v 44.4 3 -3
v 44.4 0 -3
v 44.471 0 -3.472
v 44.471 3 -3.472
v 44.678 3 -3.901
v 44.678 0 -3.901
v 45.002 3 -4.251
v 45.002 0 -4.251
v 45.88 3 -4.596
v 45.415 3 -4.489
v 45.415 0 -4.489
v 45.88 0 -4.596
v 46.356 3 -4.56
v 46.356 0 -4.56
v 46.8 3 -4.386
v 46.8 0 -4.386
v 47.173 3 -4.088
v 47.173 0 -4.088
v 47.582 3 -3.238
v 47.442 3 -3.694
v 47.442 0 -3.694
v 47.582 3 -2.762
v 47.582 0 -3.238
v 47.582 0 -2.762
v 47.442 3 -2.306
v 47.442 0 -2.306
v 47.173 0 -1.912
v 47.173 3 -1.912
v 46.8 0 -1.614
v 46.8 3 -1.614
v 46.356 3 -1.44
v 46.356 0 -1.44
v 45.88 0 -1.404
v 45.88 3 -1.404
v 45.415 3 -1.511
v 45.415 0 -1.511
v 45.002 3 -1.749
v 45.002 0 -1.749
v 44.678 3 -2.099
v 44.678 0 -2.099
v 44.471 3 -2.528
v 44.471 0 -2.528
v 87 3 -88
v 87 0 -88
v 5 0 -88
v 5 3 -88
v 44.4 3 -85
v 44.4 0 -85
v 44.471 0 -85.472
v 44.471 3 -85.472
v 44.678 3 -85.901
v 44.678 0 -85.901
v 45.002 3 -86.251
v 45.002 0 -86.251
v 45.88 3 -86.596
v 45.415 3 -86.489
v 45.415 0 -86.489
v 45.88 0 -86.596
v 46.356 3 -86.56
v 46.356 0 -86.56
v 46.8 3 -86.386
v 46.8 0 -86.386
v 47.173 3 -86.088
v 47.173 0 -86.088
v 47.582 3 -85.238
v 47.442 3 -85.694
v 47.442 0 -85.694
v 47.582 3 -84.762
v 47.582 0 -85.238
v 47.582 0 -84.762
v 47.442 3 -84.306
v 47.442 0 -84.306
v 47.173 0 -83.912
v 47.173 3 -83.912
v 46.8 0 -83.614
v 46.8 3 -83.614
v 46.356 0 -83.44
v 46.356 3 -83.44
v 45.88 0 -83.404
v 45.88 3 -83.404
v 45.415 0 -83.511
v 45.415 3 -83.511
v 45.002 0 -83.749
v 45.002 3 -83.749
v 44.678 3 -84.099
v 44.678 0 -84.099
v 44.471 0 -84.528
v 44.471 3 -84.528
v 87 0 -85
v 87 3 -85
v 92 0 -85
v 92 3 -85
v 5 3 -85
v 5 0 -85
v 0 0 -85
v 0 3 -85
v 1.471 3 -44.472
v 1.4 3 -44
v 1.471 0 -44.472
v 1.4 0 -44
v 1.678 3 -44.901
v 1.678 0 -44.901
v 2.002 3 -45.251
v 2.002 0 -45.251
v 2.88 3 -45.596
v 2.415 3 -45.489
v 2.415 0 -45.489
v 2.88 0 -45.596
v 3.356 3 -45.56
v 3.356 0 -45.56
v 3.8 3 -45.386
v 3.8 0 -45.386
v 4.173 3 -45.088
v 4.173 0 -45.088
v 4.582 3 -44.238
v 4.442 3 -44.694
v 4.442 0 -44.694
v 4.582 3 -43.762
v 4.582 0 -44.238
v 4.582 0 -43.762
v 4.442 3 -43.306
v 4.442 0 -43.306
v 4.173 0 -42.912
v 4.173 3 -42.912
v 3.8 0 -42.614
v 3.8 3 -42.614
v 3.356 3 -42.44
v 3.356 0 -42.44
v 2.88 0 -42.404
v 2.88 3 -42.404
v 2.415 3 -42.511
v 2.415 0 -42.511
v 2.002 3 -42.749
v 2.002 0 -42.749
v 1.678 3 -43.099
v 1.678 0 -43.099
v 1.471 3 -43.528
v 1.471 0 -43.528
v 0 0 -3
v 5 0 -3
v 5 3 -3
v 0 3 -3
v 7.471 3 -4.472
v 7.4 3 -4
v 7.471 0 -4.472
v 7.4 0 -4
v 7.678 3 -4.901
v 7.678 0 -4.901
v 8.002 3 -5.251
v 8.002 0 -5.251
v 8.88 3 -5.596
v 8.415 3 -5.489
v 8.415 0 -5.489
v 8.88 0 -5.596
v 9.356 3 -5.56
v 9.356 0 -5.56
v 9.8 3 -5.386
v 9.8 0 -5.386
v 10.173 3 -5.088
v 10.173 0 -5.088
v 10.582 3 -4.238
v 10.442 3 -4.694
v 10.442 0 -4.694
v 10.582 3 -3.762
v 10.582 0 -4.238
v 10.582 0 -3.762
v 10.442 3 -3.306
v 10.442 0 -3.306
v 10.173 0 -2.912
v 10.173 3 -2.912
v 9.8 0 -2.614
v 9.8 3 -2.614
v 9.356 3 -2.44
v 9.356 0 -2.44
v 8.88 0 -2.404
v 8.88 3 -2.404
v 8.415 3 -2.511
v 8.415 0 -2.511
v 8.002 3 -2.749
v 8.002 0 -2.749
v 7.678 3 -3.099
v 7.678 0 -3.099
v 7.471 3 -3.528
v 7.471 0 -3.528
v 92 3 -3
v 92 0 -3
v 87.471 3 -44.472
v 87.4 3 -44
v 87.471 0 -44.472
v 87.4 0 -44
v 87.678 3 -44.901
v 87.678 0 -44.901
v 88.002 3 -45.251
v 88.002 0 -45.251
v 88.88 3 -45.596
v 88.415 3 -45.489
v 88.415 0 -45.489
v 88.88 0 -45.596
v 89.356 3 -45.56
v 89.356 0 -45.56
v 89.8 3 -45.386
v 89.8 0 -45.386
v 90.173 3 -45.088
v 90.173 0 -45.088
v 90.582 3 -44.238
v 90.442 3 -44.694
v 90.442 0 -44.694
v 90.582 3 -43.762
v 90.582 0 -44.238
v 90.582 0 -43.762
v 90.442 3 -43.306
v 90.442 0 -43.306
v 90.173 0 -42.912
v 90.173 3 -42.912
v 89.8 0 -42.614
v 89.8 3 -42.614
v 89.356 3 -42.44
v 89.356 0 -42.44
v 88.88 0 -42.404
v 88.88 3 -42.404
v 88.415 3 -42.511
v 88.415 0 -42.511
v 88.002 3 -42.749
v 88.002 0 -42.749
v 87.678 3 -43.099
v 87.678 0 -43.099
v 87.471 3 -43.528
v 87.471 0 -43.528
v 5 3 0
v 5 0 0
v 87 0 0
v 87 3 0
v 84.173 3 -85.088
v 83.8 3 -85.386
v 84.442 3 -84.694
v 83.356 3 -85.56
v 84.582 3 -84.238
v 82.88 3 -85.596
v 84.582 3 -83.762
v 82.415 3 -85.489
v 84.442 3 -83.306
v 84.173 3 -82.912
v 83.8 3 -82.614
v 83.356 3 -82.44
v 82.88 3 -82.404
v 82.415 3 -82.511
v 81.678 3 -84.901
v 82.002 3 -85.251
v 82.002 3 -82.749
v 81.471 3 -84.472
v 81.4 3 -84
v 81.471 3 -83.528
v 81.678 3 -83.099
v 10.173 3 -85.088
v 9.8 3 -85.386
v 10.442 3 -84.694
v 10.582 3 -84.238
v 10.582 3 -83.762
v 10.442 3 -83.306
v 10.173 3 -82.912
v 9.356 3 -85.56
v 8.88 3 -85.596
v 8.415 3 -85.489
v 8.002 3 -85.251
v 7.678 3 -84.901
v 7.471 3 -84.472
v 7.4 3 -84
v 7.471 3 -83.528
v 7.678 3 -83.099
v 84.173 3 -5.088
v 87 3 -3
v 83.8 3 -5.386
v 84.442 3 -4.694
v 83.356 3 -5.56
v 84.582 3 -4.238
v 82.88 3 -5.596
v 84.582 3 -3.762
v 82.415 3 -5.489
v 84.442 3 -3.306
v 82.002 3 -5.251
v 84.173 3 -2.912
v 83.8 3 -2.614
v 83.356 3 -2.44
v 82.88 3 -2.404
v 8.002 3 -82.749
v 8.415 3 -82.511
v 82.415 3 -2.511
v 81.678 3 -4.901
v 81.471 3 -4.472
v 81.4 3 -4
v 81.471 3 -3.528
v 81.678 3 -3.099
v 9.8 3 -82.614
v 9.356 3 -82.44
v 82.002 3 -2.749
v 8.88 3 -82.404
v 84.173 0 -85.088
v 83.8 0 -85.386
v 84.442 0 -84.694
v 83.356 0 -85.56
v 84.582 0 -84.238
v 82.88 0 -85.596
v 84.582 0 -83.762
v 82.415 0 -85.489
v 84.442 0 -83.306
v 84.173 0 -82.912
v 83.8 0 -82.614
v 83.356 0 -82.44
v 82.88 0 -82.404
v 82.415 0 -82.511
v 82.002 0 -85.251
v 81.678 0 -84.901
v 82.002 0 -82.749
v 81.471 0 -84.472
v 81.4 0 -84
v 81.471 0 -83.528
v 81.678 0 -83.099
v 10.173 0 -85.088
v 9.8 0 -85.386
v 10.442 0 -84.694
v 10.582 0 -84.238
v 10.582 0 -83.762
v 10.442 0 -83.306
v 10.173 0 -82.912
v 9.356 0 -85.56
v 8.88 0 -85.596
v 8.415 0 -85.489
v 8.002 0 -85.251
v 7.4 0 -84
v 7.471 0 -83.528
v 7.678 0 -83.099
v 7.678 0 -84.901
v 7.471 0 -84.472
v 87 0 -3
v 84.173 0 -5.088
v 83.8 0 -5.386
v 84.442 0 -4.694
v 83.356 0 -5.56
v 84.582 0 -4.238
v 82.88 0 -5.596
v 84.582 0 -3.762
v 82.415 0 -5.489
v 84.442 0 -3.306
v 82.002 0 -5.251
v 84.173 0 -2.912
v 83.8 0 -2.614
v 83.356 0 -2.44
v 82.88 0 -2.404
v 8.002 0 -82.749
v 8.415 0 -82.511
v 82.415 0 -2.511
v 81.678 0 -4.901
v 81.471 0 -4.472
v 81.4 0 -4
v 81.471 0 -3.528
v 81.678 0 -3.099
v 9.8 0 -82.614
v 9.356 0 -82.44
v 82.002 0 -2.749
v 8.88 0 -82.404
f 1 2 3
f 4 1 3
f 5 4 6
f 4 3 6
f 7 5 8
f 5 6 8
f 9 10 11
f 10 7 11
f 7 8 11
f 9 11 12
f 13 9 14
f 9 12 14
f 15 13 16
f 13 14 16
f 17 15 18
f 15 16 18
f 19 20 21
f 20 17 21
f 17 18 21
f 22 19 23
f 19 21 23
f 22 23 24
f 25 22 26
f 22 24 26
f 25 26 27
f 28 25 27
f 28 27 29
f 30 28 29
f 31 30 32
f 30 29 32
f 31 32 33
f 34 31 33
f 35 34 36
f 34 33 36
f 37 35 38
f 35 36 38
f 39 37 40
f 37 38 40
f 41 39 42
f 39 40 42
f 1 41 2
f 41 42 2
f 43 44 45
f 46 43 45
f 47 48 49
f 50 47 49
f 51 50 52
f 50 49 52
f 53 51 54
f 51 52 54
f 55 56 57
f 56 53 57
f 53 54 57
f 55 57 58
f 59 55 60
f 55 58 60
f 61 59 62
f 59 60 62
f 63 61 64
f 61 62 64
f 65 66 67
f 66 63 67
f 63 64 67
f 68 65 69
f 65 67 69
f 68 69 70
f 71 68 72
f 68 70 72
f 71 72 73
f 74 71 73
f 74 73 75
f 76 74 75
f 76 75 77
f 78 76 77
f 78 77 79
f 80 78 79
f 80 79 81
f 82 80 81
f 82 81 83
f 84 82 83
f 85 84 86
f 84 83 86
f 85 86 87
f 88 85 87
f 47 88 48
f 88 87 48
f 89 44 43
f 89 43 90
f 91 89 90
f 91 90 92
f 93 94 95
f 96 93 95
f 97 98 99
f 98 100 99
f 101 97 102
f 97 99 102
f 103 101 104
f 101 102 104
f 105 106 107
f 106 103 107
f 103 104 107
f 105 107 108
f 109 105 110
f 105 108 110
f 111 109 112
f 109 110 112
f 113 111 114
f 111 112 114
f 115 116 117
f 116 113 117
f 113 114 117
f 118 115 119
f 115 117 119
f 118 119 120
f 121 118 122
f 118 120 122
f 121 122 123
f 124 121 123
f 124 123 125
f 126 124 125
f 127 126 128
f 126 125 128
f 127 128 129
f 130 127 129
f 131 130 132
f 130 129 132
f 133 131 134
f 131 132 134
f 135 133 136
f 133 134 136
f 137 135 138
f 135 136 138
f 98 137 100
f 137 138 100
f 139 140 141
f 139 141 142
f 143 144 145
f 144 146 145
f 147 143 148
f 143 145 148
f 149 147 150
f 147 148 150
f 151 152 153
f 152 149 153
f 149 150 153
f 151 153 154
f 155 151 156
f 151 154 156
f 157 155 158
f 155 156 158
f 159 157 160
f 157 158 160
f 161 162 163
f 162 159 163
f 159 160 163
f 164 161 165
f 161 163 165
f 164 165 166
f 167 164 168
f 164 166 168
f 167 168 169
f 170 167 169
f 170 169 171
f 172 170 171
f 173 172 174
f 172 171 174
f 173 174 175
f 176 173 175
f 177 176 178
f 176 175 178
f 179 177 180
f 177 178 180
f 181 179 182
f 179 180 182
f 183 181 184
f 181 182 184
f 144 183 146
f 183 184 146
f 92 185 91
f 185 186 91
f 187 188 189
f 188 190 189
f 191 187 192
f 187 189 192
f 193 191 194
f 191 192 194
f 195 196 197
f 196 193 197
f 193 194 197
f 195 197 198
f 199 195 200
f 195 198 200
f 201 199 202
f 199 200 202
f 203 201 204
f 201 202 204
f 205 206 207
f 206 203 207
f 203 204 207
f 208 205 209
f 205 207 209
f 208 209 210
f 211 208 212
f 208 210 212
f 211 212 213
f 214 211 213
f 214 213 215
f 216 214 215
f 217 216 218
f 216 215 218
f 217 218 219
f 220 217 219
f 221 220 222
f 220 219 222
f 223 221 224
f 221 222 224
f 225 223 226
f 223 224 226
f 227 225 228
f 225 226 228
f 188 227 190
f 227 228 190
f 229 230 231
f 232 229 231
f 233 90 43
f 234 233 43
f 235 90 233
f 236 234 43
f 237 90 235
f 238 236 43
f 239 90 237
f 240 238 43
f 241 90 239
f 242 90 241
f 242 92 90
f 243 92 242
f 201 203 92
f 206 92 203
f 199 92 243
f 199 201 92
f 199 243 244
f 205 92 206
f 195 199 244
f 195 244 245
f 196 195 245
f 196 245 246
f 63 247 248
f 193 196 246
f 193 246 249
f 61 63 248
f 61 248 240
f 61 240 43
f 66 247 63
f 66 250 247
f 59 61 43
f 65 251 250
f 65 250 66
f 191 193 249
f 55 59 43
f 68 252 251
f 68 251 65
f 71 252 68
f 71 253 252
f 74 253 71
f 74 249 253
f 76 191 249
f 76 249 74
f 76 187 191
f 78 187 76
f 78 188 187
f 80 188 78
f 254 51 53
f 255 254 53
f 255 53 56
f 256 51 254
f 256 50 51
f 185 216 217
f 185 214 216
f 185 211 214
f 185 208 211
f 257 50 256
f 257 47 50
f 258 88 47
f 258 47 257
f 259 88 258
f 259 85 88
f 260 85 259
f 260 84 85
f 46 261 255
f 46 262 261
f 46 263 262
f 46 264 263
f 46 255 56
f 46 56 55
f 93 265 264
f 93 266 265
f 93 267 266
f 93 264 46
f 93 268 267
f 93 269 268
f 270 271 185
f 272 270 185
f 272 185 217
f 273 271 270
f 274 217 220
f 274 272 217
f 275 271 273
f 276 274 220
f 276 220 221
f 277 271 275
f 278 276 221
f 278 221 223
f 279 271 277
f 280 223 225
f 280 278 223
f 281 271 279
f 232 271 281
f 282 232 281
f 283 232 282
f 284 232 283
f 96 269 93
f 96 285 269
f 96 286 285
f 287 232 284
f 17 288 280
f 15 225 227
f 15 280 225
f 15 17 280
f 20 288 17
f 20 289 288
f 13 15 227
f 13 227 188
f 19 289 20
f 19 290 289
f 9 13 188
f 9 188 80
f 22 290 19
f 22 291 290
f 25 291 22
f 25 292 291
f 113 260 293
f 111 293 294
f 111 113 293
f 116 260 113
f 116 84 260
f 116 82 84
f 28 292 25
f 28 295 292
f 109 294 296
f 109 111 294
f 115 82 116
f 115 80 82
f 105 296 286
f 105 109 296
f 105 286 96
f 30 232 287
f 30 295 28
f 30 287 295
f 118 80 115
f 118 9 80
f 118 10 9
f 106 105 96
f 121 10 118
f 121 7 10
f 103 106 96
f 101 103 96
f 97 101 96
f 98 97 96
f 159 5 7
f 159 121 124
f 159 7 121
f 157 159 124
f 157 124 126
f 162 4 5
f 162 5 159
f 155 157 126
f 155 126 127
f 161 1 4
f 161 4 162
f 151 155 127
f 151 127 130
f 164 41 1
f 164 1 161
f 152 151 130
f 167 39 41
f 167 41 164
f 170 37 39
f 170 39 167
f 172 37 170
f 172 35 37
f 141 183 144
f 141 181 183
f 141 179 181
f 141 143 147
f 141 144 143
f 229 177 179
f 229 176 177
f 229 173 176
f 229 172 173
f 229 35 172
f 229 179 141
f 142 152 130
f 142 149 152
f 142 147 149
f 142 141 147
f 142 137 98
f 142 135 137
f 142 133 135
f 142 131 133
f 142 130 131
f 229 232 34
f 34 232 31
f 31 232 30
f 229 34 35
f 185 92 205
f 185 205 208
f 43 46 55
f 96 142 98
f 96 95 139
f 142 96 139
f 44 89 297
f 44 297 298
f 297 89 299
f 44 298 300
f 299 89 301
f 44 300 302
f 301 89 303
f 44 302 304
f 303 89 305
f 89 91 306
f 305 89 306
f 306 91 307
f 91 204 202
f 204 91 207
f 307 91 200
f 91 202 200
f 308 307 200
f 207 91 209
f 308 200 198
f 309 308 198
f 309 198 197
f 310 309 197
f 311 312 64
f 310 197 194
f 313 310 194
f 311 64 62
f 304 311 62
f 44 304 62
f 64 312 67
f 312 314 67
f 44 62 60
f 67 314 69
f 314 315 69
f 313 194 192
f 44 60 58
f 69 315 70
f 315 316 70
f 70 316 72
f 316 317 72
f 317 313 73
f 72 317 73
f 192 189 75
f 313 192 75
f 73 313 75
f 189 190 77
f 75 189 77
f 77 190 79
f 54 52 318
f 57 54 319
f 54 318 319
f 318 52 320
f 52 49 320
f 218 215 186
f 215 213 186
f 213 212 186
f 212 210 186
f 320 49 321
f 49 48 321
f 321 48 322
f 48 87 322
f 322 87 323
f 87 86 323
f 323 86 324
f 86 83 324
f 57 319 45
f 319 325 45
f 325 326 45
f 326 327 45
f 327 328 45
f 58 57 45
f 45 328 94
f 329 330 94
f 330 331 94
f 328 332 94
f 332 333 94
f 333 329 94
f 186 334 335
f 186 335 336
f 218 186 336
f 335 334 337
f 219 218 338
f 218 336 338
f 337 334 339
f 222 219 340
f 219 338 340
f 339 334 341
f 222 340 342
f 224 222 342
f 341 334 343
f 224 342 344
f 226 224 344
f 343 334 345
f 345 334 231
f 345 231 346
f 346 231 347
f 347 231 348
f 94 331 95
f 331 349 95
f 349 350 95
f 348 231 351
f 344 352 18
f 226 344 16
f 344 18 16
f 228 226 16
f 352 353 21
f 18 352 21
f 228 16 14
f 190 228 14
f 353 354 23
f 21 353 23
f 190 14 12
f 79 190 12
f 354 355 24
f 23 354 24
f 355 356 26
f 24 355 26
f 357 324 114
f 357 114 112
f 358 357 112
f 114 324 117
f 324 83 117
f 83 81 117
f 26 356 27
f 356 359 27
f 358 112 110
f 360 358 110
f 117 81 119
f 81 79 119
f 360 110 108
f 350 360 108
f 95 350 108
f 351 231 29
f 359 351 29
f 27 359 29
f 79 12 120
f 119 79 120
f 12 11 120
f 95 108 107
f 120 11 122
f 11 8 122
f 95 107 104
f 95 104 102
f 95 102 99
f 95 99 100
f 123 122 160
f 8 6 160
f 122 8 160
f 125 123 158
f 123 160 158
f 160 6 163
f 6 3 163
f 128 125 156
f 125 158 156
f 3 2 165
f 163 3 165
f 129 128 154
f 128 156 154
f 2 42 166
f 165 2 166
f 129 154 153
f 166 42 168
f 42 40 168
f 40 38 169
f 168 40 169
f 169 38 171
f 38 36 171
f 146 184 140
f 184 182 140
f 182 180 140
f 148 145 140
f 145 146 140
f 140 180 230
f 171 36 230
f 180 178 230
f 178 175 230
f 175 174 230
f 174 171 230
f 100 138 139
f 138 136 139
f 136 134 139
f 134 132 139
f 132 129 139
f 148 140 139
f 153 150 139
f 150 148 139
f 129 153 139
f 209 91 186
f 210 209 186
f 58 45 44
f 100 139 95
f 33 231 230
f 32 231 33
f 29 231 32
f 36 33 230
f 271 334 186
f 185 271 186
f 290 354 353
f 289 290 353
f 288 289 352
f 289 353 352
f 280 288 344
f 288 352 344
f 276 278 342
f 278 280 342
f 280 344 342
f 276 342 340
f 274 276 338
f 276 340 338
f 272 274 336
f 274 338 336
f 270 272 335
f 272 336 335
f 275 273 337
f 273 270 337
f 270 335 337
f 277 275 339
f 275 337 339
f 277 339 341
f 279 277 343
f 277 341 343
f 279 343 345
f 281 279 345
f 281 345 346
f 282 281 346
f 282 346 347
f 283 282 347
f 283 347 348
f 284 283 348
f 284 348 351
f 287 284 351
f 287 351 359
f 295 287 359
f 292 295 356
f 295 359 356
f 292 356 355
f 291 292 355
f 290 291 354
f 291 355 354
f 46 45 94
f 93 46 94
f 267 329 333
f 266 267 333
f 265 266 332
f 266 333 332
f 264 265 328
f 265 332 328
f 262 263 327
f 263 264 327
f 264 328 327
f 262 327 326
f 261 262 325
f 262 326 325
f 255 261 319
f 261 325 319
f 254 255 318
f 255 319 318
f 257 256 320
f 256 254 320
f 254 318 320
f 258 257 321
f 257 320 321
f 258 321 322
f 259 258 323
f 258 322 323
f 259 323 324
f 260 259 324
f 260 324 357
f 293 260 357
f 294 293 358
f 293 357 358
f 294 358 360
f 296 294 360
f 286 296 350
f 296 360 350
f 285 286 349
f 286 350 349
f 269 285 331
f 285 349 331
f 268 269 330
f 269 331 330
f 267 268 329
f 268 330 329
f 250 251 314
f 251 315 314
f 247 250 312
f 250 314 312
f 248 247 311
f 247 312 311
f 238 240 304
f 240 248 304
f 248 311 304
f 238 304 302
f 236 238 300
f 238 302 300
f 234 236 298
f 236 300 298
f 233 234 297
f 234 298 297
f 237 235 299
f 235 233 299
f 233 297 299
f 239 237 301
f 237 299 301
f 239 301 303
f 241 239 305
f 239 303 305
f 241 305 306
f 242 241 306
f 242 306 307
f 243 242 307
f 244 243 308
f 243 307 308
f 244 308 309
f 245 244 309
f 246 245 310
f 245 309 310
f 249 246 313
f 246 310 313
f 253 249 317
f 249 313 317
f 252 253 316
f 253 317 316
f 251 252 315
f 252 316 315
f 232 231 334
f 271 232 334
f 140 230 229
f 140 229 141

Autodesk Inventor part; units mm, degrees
ref_plane "YZ Plane" through (0, 0, 0) normal (1, 0, 0) x (0, 1, 0)
ref_plane "XZ Plane" through (0, 0, 0) normal (0, 1, 0) x (-1, 0, 0)
ref_plane "XY Plane" through (0, 0, 0) normal (0, 0, 1) x (1, 0, 0)
sketch "Sketch1" plane through (0, 0, 0) normal (0, 1, 0) x (-1, 0, 0)
  line L0 (0, 0) -> (-92, 0)
  line L1 (-92, 0) -> (-92, -88)
  line L2 (-92, -88) -> (0, -88)
  line L3 (0, -88) -> (0, 0)
  line L4 (0, -88) -> (-5, -88)
  line L5 (-5, -88) -> (-5, -85)
  line L6 (-5, -85) -> (0, -85)
  line L7 (0, -85) -> (0, -88)
  line L8 (0, 0) -> (-5, 0)
  line L9 (-5, 0) -> (-5, -3)
  line L10 (-5, -3) -> (0, -3)
  line L11 (0, -3) -> (0, 0)
  line L12 (-92, 0) -> (-87, 0)
  line L13 (-87, 0) -> (-87, -3)
  line L14 (-87, -3) -> (-92, -3)
  line L15 (-92, -3) -> (-92, 0)
  line L16 (-92, -88) -> (-87, -88)
  line L17 (-87, -88) -> (-87, -85)
  line L18 (-87, -85) -> (-92, -85)
  line L19 (-92, -85) -> (-92, -88)
  circle A0 centre (-9, -84) radius 1.6
  circle A1 centre (-83, -84) radius 1.6
  circle A2 centre (-9, -4) radius 1.6
  circle A3 centre (-83, -4) radius 1.6
  circle A4 centre (-46, -85) radius 1.6
  circle A5 centre (-3, -44) radius 1.6
  circle A6 centre (-89, -44) radius 1.6
  circle A7 centre (-46, -3) radius 1.6
  point P0 (0, -85)
  point P1 (0, -3)
  dimension "d6" = 82
  dimension "d8" = 88
  dimension "d10" = 92
  dimension "d11" = 5
  dimension "d12" = 3.2
  dimension "d13" = 74
  dimension "d14" = 80
  dimension "d15" = 9
  dimension "d16" = 4
  dimension "d17" = 3.2
  dimension "d18" = 46
  dimension "d19" = 44
  dimension "d20" = 3
  dimension "d21" = 3
  dimension "d22" = 3
  dimension "d23" = 3
extrude "Extrusion1" add sketch "Sketch1" along normal blind 3 contours L9 L10 L3 L6 L5 L2 L17 L18 L1 L14 L13 L0
equation "\"d15\" = -0.5 * d13 + 0.5 * d10"
equation "\"d16\" = -0.5 * d14 + 0.5 * d8"
equation "\"d18\" = 0.5 * d10"
equation "\"d19\" = 0.5 * d8"
equation "\"d21\" = d20"
equation "\"d23\" = d22"
properties part number "DummyUpperBoard"
